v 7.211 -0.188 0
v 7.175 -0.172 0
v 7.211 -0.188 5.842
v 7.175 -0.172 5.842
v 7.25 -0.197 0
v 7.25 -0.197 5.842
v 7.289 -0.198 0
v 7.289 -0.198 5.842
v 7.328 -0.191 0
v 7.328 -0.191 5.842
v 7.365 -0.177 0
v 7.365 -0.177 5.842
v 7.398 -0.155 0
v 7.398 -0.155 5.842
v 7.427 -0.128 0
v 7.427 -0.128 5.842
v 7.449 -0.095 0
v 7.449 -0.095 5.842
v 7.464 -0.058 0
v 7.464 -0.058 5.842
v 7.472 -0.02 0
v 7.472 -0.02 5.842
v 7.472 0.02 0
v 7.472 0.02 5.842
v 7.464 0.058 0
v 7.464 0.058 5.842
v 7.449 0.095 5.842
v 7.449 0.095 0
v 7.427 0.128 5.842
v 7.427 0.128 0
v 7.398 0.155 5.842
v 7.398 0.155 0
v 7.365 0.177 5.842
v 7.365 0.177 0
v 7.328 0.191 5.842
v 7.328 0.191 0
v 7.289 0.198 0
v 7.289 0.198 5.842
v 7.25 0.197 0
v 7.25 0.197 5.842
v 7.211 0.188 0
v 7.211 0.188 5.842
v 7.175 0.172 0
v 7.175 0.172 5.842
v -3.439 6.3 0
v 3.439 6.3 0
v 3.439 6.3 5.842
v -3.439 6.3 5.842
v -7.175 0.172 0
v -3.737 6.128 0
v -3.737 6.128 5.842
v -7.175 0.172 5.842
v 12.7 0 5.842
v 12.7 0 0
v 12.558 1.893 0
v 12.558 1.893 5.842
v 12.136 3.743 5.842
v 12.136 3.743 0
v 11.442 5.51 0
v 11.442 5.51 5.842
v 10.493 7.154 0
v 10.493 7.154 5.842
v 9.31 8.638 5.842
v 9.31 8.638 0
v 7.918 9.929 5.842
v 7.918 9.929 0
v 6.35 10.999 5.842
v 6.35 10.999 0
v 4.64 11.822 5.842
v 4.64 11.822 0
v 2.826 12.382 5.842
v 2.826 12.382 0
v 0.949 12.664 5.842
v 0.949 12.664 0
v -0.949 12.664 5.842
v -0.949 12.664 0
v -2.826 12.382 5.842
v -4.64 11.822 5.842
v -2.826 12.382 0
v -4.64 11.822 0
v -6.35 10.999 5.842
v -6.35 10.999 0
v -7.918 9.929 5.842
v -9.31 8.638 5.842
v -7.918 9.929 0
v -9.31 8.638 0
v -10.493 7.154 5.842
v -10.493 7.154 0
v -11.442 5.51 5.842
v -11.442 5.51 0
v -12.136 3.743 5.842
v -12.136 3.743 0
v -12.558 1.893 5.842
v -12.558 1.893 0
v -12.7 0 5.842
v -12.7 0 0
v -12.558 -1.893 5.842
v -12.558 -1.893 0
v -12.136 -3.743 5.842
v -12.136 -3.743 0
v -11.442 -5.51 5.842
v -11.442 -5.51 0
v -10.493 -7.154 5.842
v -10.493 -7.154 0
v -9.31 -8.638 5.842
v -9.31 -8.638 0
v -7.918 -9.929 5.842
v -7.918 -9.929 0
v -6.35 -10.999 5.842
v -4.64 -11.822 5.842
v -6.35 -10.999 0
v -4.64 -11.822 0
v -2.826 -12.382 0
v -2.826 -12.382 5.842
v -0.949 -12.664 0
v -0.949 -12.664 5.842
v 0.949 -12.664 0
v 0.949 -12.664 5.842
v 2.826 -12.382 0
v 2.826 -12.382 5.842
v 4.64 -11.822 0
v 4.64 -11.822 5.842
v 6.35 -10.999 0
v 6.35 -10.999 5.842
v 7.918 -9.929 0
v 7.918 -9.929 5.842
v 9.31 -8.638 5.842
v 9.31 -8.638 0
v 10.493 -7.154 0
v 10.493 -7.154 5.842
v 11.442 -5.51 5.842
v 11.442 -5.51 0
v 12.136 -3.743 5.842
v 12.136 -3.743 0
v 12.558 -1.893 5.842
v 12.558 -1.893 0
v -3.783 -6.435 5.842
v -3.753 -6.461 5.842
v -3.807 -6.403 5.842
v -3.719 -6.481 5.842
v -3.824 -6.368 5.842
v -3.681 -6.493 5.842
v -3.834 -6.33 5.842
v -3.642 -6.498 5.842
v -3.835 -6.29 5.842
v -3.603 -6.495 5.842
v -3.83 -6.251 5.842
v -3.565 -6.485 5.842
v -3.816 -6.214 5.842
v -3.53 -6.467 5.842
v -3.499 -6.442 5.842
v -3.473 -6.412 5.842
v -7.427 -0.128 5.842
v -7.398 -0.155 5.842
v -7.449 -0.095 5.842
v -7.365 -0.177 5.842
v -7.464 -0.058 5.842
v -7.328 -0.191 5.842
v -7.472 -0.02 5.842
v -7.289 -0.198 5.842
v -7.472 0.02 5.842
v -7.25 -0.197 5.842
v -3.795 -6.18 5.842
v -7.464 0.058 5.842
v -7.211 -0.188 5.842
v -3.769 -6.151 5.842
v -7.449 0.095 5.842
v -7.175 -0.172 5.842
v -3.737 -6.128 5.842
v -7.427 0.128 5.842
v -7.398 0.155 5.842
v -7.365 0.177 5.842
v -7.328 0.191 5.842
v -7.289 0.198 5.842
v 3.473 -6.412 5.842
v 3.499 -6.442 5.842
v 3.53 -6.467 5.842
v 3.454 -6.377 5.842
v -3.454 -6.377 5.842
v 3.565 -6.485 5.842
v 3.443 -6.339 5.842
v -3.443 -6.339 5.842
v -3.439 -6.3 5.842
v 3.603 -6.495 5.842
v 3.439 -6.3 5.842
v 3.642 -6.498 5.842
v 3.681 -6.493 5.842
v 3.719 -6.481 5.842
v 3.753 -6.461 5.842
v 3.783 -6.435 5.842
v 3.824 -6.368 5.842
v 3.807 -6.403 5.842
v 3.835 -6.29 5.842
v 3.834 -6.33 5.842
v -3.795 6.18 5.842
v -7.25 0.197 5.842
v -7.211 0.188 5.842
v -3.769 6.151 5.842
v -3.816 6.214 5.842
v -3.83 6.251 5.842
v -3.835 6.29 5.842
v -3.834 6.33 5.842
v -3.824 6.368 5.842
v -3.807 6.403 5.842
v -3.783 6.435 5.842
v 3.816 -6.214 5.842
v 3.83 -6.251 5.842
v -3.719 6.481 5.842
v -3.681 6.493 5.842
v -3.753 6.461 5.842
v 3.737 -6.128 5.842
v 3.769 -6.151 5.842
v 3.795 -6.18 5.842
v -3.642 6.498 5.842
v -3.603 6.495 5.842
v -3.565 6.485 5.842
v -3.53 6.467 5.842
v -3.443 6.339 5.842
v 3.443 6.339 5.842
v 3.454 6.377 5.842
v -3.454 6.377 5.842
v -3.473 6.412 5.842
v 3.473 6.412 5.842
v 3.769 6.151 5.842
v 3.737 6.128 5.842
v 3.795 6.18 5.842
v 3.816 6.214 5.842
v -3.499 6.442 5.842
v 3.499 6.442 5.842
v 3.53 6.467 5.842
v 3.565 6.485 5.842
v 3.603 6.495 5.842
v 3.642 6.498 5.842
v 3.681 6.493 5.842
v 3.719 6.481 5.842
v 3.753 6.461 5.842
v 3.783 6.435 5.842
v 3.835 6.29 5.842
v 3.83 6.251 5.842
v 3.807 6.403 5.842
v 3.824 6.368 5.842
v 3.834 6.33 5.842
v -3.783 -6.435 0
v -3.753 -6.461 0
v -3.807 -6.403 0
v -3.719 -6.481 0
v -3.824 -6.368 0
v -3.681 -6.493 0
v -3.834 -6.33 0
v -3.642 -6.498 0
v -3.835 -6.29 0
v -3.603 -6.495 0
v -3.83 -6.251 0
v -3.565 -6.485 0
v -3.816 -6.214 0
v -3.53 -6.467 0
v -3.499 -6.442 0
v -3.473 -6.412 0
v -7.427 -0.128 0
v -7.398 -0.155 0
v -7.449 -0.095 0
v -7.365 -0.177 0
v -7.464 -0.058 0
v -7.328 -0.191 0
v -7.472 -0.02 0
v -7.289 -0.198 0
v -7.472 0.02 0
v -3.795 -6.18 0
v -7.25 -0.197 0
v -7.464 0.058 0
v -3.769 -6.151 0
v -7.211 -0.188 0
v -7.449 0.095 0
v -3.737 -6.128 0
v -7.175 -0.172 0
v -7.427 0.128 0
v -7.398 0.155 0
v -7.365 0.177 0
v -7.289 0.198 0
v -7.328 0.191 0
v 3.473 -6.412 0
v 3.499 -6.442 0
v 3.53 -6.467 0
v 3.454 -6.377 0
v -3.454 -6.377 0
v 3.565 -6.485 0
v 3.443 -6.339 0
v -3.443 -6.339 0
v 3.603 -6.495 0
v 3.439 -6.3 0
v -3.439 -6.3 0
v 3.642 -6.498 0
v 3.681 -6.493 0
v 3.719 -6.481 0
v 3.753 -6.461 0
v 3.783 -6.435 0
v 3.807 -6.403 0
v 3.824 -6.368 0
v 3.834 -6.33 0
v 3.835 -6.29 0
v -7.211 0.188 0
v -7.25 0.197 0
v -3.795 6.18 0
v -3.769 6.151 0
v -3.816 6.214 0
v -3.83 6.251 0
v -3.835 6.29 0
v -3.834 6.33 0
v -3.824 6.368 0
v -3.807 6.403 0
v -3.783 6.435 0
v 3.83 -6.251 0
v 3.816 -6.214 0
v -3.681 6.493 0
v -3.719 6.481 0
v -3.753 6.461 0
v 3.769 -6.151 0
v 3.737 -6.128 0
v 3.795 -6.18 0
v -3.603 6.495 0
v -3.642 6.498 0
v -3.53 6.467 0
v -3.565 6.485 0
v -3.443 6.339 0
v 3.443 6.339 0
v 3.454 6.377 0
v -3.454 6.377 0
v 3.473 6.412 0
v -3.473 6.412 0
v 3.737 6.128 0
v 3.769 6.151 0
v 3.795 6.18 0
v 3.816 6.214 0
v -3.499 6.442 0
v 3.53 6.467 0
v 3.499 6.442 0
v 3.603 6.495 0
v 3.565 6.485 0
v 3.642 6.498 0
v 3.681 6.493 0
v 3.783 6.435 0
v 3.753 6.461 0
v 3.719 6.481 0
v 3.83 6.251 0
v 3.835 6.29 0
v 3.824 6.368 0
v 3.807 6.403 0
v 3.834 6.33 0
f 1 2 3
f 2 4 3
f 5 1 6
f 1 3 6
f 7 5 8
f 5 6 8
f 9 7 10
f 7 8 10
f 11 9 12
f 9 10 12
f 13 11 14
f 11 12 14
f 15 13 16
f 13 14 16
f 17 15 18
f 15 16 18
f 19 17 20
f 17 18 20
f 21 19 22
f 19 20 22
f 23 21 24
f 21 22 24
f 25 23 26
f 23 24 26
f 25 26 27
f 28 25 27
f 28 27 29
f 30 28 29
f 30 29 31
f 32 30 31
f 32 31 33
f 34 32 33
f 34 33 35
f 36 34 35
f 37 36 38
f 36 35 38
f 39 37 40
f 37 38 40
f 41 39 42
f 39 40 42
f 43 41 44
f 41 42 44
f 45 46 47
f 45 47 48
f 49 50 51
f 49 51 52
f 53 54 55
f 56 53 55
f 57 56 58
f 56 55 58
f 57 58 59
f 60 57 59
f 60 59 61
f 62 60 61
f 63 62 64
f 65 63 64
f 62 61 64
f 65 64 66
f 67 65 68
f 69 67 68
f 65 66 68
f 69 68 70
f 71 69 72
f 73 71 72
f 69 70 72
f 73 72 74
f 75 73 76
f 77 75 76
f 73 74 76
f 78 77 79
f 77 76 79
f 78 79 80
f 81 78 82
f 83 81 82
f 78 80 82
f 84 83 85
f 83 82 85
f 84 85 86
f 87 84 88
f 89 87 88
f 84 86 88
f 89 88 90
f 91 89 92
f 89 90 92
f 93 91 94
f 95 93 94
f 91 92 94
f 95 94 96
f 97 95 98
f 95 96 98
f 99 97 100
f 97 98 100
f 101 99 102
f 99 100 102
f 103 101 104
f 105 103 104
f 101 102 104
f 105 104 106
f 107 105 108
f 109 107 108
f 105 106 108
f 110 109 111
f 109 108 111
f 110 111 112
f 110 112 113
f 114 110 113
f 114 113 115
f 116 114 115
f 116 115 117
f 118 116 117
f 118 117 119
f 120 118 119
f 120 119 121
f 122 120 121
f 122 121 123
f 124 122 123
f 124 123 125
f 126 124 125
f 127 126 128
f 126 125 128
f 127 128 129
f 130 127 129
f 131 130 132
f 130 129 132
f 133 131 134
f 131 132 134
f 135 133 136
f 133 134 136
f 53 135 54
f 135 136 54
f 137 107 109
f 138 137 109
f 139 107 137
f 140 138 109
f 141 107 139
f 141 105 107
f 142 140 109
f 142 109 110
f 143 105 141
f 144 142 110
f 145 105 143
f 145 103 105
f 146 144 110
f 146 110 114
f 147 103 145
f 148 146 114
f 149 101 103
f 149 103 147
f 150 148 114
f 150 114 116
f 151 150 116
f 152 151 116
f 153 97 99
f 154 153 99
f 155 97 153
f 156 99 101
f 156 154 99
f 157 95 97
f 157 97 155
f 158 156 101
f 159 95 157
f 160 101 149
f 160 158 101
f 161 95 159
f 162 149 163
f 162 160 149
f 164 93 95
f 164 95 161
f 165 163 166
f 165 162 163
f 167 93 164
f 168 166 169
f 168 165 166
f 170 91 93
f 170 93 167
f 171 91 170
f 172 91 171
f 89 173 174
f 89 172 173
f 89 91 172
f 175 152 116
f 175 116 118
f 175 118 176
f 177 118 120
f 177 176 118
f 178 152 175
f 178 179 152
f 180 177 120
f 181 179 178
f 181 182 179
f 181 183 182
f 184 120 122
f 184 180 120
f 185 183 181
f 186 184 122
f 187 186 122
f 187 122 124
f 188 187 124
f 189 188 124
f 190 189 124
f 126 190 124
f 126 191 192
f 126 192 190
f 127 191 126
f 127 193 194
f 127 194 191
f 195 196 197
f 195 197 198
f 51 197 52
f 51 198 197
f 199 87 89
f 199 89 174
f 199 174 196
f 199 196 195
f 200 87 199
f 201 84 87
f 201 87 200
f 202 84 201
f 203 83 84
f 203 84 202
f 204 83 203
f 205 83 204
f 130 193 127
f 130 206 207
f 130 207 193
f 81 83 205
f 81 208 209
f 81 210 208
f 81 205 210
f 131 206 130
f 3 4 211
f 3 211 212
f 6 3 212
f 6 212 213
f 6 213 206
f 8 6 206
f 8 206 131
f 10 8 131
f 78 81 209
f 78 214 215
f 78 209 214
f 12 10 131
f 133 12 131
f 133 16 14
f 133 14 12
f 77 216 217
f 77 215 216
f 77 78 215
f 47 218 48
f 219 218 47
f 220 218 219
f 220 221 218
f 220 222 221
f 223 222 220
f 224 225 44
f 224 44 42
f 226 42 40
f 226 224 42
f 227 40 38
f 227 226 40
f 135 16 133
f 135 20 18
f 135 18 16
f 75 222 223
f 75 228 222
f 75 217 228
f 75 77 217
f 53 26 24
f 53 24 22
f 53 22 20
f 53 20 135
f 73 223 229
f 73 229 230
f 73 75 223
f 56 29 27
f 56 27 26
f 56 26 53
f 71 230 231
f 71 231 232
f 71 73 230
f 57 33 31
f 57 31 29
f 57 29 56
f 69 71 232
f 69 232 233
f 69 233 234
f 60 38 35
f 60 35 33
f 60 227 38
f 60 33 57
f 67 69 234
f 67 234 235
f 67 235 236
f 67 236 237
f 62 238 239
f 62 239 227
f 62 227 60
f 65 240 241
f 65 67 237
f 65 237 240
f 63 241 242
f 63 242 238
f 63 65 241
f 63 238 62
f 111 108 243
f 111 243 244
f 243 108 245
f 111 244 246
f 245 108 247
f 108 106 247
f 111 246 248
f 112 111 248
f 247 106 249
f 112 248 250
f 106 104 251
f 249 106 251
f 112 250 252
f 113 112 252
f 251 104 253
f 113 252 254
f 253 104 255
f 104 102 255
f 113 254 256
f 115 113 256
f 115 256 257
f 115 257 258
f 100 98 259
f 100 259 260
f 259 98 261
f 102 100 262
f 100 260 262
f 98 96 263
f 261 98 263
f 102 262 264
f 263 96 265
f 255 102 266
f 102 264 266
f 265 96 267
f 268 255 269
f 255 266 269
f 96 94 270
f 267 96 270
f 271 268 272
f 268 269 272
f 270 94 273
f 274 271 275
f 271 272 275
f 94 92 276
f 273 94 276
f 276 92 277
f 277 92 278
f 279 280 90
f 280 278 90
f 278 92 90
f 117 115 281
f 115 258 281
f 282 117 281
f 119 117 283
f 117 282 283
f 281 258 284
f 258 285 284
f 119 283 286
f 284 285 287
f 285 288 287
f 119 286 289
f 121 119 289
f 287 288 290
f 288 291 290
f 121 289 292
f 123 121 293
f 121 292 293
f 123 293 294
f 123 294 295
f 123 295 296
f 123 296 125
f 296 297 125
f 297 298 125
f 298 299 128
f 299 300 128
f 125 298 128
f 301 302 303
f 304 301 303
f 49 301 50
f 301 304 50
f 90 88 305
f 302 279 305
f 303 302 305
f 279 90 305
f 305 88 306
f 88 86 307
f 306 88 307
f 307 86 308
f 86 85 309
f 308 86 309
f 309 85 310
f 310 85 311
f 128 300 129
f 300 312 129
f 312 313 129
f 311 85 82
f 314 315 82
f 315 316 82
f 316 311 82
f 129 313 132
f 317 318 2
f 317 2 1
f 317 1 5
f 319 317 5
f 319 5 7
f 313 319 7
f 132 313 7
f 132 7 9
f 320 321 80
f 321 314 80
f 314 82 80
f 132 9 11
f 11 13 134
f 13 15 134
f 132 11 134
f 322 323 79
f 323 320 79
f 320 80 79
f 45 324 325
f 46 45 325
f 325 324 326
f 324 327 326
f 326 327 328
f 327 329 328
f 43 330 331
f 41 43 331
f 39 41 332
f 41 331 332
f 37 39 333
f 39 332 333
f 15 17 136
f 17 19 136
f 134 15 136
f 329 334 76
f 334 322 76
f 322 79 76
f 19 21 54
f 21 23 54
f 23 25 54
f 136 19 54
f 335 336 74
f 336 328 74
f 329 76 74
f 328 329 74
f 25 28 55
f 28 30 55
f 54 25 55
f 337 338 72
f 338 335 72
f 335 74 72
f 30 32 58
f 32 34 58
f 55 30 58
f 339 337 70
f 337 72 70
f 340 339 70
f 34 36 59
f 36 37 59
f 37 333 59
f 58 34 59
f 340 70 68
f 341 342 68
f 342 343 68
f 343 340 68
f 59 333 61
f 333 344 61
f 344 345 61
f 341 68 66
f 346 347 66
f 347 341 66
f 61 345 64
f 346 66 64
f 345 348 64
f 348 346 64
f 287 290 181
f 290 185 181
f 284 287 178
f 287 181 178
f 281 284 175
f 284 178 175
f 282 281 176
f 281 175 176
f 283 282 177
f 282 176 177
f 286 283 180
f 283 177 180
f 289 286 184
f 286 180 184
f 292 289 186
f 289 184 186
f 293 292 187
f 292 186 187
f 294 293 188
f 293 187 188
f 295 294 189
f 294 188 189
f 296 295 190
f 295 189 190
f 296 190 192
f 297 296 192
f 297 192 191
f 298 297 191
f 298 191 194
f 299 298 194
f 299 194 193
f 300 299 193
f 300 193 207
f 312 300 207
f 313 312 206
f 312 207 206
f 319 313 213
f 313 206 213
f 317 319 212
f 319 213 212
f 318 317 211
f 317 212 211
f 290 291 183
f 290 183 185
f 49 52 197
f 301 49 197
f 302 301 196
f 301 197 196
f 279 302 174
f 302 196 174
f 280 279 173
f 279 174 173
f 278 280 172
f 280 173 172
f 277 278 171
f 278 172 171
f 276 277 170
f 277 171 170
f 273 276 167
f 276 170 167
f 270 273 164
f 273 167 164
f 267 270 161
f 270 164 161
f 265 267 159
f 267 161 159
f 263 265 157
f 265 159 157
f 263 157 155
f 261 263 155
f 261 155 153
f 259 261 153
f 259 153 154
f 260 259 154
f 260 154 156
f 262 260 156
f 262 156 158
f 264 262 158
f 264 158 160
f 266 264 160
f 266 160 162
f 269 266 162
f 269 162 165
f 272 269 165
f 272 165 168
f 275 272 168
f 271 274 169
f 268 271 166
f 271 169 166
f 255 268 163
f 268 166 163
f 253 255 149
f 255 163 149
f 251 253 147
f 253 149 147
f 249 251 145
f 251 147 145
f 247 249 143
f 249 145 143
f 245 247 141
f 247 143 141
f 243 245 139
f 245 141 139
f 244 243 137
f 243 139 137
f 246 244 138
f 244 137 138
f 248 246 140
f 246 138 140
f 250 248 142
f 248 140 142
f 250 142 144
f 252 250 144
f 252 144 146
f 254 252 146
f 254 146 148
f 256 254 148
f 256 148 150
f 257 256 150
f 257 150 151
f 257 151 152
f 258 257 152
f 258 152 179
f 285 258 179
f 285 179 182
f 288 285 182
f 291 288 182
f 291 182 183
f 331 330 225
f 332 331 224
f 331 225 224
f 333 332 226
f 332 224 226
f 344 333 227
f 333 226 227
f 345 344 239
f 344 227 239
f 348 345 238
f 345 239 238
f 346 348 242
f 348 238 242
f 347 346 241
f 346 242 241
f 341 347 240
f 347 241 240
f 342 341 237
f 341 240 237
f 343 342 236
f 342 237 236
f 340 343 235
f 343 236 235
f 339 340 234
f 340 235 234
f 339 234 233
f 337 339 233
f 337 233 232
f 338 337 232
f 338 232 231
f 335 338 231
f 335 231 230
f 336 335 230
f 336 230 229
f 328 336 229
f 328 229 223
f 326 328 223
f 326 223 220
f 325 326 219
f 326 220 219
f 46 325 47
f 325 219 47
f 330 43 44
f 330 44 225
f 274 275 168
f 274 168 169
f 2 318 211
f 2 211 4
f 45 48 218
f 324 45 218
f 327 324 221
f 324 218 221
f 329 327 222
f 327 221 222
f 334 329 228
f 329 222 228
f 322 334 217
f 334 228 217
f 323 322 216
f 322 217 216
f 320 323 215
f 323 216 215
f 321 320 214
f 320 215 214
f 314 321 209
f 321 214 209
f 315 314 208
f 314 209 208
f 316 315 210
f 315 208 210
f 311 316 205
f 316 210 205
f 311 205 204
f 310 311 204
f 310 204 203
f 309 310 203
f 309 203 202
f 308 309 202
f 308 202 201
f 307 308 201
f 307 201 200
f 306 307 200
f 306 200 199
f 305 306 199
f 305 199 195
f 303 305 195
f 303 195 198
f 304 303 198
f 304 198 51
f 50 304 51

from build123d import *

# Parameters (mm, degrees)
SKETCH1_R           = 12.7
BOSS_EXTRUDE1_DEPTH = 5.842
SKETCH2_R           = 0.1984375
CUT_EXTRUDE1_DEPTH  = 19.886740428


with BuildPart() as part:
    # Sketch1 → Boss-Extrude1 (new body)
    with BuildSketch(Plane.XY):
        Circle(SKETCH1_R)
        Polygon((-7.274613392, 0), (-3.637306696, -6.3), (3.637306696, -6.3), (7.274613392, 0), (3.637306696, 6.3), (-3.637306696, 6.3), align=None, mode=Mode.SUBTRACT)
    extrude(amount=BOSS_EXTRUDE1_DEPTH)

    # Sketch2 → Cut-Extrude1 (cut, through all)
    with BuildSketch(Plane.XY.offset(5.842)):
        with Locations((3.637306696, 6.3)):
            Circle(SKETCH2_R)
        with Locations((-3.637306696, 6.3)):
            Circle(SKETCH2_R)
        with Locations((-7.274613392, 0)):
            Circle(SKETCH2_R)
        with Locations((-3.637306696, -6.3)):
            Circle(SKETCH2_R)
        with Locations((3.637306696, -6.3)):
            Circle(SKETCH2_R)
        with Locations((7.274613392, 0)):
            Circle(SKETCH2_R)
    extrude(amount=-CUT_EXTRUDE1_DEPTH, mode=Mode.SUBTRACT)


solid = part.part
